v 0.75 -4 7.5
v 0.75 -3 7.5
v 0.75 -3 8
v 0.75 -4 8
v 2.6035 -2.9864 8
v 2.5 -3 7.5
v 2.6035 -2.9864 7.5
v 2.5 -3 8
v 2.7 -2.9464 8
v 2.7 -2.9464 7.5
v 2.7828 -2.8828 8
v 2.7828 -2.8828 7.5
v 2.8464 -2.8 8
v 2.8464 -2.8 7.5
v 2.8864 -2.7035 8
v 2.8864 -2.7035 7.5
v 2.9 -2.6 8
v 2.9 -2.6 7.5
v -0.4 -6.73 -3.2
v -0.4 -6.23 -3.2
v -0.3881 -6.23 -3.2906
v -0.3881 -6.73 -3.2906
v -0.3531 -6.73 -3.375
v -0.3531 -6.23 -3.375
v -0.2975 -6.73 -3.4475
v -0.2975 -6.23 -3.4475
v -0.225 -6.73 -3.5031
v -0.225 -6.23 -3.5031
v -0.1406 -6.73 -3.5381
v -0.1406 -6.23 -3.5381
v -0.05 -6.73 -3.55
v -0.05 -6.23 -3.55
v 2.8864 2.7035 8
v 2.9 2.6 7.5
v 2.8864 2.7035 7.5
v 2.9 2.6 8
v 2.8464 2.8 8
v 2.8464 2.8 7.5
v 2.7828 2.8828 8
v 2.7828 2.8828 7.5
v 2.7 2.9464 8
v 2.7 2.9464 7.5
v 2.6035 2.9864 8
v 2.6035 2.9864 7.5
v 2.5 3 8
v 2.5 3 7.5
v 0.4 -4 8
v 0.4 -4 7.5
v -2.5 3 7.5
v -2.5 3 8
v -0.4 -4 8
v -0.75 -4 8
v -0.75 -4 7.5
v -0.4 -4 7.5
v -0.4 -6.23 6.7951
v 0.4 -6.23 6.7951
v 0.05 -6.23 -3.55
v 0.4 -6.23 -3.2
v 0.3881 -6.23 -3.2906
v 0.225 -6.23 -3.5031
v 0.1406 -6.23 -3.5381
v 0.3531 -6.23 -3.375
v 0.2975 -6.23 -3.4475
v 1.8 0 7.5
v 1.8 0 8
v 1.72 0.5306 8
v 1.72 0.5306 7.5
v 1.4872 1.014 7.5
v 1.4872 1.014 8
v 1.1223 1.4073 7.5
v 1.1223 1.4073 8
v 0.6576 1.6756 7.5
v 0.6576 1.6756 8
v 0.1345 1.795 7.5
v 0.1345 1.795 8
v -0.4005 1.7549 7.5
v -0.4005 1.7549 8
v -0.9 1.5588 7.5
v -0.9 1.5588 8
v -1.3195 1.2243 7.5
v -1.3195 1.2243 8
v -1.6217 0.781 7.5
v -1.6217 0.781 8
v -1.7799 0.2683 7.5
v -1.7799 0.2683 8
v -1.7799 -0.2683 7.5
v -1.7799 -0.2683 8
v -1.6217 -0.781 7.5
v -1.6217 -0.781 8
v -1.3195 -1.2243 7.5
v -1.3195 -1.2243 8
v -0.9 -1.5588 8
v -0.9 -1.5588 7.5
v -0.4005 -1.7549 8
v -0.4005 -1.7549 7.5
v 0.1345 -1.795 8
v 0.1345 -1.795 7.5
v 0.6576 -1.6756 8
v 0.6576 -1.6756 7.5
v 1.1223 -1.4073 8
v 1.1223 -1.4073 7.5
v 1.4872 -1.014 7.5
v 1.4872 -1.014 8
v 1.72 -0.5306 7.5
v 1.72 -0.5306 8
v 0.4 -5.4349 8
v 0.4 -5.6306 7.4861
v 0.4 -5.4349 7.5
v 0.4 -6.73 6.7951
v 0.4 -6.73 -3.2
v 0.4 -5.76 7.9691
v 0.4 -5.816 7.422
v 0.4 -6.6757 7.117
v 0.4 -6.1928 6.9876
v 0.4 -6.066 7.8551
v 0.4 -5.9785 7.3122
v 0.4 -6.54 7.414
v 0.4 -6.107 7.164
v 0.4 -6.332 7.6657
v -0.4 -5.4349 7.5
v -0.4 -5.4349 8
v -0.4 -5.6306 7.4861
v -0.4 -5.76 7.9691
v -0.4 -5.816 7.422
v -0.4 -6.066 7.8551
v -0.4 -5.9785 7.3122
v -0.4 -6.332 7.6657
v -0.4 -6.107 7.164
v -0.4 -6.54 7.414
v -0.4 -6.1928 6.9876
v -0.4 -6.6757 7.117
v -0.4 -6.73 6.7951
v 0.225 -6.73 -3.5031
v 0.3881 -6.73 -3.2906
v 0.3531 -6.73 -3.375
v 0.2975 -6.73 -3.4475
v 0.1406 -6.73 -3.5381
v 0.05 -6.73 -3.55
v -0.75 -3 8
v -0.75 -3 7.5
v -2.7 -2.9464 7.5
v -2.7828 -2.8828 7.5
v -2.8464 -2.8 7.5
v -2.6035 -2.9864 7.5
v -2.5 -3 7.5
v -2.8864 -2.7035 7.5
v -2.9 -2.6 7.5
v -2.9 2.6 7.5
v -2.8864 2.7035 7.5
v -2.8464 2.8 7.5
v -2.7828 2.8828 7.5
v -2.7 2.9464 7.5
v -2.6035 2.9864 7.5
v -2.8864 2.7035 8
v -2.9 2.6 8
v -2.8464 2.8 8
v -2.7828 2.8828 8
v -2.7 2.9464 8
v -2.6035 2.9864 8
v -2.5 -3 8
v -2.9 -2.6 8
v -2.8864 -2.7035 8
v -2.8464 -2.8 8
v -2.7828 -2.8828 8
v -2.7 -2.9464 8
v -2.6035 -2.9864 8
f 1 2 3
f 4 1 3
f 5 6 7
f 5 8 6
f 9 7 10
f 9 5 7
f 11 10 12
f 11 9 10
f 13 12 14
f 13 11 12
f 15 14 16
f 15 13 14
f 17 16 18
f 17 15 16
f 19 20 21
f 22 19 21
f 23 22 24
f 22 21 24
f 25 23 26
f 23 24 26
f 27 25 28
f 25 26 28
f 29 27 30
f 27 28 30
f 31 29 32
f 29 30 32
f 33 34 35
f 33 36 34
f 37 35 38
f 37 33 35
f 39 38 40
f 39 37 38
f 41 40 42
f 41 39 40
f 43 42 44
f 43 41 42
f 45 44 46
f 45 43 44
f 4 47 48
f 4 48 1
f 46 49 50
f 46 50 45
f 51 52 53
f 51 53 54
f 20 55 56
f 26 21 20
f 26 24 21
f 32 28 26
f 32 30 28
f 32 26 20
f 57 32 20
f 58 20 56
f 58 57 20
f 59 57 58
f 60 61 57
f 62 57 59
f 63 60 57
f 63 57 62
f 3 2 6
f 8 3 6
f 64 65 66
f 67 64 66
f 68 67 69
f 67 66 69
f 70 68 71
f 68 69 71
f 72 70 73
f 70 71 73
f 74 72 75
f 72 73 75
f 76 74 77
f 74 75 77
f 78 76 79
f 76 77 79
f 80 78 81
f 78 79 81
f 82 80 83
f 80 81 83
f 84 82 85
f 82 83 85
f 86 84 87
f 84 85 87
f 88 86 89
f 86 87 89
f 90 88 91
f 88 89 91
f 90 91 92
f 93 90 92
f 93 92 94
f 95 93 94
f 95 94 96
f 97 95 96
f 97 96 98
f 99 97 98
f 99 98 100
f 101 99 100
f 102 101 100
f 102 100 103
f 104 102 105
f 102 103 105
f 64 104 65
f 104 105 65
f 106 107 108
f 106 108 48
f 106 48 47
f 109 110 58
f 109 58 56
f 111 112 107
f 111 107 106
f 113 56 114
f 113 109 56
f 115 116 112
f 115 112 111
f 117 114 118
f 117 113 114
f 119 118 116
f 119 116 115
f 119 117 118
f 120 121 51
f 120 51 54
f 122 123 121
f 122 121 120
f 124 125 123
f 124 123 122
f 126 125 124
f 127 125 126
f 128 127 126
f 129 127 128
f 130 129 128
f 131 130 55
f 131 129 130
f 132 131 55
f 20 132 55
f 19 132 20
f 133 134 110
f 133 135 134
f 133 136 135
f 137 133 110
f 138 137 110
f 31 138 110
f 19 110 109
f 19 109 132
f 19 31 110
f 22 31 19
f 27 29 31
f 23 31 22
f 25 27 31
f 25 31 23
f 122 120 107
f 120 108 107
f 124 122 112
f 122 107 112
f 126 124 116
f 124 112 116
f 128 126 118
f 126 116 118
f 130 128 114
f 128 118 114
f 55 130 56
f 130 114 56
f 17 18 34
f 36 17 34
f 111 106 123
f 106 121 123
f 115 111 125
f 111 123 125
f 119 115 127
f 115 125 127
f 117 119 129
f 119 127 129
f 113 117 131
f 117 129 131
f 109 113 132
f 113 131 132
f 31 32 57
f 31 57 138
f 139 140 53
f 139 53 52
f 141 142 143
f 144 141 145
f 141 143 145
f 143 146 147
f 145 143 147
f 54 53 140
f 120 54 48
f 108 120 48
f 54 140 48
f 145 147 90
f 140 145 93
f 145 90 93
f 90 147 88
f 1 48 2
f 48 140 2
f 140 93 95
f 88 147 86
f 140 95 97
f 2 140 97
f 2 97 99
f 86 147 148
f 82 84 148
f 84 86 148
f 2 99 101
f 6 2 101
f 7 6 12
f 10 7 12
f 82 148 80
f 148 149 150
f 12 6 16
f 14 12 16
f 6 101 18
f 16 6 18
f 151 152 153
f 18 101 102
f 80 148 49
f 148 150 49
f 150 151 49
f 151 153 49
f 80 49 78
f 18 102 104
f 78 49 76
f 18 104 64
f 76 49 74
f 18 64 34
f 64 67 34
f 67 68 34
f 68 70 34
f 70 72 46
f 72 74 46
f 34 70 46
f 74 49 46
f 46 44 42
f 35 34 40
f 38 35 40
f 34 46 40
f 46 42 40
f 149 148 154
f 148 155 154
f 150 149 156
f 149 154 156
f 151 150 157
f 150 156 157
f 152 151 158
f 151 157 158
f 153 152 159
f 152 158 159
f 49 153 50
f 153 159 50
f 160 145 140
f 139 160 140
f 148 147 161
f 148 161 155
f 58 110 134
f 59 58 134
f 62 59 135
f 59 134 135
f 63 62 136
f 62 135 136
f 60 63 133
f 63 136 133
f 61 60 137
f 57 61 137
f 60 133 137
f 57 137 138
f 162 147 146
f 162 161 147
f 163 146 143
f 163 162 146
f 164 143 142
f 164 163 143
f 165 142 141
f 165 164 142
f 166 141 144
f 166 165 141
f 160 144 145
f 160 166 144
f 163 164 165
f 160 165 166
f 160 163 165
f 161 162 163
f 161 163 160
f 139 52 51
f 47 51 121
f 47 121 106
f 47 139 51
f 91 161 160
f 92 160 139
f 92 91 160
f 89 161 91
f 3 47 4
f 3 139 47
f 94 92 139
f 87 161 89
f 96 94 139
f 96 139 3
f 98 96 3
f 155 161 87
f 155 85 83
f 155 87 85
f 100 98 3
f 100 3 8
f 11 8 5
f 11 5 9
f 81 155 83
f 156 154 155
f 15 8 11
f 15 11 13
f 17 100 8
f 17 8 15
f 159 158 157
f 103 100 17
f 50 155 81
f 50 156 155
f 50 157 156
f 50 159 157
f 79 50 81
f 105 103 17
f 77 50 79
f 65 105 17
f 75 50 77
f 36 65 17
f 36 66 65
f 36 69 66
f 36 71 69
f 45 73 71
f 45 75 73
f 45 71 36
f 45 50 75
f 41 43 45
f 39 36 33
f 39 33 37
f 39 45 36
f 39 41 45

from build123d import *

# Parameters (mm, degrees)
SKETCH008_W     = 5.8
SKETCH008_H     = 6
PAD002_DEPTH    = 0.5
FILLET001_R     = 0.4
SKETCH009_W     = 1.5
SKETCH009_H     = 0.5
PAD003_DEPTH    = 1
SKETCH010_W     = 0.8
SKETCH010_H     = 0.5
FILLET002_R     = 0.35
SKETCH024_R     = 1.8
POCKET008_DEPTH = 0.5


with BuildPart() as part:
    # Sketch008 (on Face1 of CopyPocket005) → Pad002 (new body)
    with BuildSketch(Plane.XY.offset(9.5)):
        Rectangle(SKETCH008_W, SKETCH008_H)
    extrude(amount=PAD002_DEPTH)

    # Fillet001
    fillet001_edges = [part.edges().sort_by_distance(p)[0] for p in [
        (2.9, -3, 9.75),
        (-2.9, -3, 9.75),
        (-2.9, 3, 9.75),
        (2.9, 3, 9.75),
    ]]
    fillet(fillet001_edges, radius=FILLET001_R)

    # Sketch009 (on Face10 of Fillet001) → Pad003 (join)
    with BuildSketch(Plane.XZ.offset(3)):
        with Locations((0, 9.75)):
            Rectangle(SKETCH009_W, SKETCH009_H)
    extrude(amount=PAD003_DEPTH)

    # AdditivePipe: sweep along a path in Sketch011
    with BuildLine(Plane.YZ.offset(0.75)) as additivepipe_path:
        Line((-4, 9.75), (-5.434939, 9.75))
        ThreePointArc((-5.434939, 9.75), (-6.155244, 9.48897), (-6.48, 8.795061))
        Line((-6.48, 8.795061), (-6.48, -1.55))
    # Sketch010 (on Face16 of Pad003) → AdditivePipe (sweep)
    with BuildSketch(Plane.XZ.offset(4)):
        with Locations((0, 9.75)):
            Rectangle(SKETCH010_W, SKETCH010_H)
    sweep(path=additivepipe_path.line)

    # Fillet002
    fillet002_edges = [part.edges().sort_by_distance(p)[0] for p in [
        (-0.4, -6.48, -1.55),
        (0.4, -6.48, -1.55),
    ]]
    fillet(fillet002_edges, radius=FILLET002_R)

    # Sketch024 (on Face32 of Fillet002) → Pocket008 (cut)
    with BuildSketch(Plane.XY.offset(10)):
        Circle(SKETCH024_R)
    extrude(amount=-POCKET008_DEPTH, mode=Mode.SUBTRACT)


with BuildPart() as part_1:
    # Body001 placement: moved
    add(part.part.moved(Location((0, 0, -2))))


solid = part_1.part
